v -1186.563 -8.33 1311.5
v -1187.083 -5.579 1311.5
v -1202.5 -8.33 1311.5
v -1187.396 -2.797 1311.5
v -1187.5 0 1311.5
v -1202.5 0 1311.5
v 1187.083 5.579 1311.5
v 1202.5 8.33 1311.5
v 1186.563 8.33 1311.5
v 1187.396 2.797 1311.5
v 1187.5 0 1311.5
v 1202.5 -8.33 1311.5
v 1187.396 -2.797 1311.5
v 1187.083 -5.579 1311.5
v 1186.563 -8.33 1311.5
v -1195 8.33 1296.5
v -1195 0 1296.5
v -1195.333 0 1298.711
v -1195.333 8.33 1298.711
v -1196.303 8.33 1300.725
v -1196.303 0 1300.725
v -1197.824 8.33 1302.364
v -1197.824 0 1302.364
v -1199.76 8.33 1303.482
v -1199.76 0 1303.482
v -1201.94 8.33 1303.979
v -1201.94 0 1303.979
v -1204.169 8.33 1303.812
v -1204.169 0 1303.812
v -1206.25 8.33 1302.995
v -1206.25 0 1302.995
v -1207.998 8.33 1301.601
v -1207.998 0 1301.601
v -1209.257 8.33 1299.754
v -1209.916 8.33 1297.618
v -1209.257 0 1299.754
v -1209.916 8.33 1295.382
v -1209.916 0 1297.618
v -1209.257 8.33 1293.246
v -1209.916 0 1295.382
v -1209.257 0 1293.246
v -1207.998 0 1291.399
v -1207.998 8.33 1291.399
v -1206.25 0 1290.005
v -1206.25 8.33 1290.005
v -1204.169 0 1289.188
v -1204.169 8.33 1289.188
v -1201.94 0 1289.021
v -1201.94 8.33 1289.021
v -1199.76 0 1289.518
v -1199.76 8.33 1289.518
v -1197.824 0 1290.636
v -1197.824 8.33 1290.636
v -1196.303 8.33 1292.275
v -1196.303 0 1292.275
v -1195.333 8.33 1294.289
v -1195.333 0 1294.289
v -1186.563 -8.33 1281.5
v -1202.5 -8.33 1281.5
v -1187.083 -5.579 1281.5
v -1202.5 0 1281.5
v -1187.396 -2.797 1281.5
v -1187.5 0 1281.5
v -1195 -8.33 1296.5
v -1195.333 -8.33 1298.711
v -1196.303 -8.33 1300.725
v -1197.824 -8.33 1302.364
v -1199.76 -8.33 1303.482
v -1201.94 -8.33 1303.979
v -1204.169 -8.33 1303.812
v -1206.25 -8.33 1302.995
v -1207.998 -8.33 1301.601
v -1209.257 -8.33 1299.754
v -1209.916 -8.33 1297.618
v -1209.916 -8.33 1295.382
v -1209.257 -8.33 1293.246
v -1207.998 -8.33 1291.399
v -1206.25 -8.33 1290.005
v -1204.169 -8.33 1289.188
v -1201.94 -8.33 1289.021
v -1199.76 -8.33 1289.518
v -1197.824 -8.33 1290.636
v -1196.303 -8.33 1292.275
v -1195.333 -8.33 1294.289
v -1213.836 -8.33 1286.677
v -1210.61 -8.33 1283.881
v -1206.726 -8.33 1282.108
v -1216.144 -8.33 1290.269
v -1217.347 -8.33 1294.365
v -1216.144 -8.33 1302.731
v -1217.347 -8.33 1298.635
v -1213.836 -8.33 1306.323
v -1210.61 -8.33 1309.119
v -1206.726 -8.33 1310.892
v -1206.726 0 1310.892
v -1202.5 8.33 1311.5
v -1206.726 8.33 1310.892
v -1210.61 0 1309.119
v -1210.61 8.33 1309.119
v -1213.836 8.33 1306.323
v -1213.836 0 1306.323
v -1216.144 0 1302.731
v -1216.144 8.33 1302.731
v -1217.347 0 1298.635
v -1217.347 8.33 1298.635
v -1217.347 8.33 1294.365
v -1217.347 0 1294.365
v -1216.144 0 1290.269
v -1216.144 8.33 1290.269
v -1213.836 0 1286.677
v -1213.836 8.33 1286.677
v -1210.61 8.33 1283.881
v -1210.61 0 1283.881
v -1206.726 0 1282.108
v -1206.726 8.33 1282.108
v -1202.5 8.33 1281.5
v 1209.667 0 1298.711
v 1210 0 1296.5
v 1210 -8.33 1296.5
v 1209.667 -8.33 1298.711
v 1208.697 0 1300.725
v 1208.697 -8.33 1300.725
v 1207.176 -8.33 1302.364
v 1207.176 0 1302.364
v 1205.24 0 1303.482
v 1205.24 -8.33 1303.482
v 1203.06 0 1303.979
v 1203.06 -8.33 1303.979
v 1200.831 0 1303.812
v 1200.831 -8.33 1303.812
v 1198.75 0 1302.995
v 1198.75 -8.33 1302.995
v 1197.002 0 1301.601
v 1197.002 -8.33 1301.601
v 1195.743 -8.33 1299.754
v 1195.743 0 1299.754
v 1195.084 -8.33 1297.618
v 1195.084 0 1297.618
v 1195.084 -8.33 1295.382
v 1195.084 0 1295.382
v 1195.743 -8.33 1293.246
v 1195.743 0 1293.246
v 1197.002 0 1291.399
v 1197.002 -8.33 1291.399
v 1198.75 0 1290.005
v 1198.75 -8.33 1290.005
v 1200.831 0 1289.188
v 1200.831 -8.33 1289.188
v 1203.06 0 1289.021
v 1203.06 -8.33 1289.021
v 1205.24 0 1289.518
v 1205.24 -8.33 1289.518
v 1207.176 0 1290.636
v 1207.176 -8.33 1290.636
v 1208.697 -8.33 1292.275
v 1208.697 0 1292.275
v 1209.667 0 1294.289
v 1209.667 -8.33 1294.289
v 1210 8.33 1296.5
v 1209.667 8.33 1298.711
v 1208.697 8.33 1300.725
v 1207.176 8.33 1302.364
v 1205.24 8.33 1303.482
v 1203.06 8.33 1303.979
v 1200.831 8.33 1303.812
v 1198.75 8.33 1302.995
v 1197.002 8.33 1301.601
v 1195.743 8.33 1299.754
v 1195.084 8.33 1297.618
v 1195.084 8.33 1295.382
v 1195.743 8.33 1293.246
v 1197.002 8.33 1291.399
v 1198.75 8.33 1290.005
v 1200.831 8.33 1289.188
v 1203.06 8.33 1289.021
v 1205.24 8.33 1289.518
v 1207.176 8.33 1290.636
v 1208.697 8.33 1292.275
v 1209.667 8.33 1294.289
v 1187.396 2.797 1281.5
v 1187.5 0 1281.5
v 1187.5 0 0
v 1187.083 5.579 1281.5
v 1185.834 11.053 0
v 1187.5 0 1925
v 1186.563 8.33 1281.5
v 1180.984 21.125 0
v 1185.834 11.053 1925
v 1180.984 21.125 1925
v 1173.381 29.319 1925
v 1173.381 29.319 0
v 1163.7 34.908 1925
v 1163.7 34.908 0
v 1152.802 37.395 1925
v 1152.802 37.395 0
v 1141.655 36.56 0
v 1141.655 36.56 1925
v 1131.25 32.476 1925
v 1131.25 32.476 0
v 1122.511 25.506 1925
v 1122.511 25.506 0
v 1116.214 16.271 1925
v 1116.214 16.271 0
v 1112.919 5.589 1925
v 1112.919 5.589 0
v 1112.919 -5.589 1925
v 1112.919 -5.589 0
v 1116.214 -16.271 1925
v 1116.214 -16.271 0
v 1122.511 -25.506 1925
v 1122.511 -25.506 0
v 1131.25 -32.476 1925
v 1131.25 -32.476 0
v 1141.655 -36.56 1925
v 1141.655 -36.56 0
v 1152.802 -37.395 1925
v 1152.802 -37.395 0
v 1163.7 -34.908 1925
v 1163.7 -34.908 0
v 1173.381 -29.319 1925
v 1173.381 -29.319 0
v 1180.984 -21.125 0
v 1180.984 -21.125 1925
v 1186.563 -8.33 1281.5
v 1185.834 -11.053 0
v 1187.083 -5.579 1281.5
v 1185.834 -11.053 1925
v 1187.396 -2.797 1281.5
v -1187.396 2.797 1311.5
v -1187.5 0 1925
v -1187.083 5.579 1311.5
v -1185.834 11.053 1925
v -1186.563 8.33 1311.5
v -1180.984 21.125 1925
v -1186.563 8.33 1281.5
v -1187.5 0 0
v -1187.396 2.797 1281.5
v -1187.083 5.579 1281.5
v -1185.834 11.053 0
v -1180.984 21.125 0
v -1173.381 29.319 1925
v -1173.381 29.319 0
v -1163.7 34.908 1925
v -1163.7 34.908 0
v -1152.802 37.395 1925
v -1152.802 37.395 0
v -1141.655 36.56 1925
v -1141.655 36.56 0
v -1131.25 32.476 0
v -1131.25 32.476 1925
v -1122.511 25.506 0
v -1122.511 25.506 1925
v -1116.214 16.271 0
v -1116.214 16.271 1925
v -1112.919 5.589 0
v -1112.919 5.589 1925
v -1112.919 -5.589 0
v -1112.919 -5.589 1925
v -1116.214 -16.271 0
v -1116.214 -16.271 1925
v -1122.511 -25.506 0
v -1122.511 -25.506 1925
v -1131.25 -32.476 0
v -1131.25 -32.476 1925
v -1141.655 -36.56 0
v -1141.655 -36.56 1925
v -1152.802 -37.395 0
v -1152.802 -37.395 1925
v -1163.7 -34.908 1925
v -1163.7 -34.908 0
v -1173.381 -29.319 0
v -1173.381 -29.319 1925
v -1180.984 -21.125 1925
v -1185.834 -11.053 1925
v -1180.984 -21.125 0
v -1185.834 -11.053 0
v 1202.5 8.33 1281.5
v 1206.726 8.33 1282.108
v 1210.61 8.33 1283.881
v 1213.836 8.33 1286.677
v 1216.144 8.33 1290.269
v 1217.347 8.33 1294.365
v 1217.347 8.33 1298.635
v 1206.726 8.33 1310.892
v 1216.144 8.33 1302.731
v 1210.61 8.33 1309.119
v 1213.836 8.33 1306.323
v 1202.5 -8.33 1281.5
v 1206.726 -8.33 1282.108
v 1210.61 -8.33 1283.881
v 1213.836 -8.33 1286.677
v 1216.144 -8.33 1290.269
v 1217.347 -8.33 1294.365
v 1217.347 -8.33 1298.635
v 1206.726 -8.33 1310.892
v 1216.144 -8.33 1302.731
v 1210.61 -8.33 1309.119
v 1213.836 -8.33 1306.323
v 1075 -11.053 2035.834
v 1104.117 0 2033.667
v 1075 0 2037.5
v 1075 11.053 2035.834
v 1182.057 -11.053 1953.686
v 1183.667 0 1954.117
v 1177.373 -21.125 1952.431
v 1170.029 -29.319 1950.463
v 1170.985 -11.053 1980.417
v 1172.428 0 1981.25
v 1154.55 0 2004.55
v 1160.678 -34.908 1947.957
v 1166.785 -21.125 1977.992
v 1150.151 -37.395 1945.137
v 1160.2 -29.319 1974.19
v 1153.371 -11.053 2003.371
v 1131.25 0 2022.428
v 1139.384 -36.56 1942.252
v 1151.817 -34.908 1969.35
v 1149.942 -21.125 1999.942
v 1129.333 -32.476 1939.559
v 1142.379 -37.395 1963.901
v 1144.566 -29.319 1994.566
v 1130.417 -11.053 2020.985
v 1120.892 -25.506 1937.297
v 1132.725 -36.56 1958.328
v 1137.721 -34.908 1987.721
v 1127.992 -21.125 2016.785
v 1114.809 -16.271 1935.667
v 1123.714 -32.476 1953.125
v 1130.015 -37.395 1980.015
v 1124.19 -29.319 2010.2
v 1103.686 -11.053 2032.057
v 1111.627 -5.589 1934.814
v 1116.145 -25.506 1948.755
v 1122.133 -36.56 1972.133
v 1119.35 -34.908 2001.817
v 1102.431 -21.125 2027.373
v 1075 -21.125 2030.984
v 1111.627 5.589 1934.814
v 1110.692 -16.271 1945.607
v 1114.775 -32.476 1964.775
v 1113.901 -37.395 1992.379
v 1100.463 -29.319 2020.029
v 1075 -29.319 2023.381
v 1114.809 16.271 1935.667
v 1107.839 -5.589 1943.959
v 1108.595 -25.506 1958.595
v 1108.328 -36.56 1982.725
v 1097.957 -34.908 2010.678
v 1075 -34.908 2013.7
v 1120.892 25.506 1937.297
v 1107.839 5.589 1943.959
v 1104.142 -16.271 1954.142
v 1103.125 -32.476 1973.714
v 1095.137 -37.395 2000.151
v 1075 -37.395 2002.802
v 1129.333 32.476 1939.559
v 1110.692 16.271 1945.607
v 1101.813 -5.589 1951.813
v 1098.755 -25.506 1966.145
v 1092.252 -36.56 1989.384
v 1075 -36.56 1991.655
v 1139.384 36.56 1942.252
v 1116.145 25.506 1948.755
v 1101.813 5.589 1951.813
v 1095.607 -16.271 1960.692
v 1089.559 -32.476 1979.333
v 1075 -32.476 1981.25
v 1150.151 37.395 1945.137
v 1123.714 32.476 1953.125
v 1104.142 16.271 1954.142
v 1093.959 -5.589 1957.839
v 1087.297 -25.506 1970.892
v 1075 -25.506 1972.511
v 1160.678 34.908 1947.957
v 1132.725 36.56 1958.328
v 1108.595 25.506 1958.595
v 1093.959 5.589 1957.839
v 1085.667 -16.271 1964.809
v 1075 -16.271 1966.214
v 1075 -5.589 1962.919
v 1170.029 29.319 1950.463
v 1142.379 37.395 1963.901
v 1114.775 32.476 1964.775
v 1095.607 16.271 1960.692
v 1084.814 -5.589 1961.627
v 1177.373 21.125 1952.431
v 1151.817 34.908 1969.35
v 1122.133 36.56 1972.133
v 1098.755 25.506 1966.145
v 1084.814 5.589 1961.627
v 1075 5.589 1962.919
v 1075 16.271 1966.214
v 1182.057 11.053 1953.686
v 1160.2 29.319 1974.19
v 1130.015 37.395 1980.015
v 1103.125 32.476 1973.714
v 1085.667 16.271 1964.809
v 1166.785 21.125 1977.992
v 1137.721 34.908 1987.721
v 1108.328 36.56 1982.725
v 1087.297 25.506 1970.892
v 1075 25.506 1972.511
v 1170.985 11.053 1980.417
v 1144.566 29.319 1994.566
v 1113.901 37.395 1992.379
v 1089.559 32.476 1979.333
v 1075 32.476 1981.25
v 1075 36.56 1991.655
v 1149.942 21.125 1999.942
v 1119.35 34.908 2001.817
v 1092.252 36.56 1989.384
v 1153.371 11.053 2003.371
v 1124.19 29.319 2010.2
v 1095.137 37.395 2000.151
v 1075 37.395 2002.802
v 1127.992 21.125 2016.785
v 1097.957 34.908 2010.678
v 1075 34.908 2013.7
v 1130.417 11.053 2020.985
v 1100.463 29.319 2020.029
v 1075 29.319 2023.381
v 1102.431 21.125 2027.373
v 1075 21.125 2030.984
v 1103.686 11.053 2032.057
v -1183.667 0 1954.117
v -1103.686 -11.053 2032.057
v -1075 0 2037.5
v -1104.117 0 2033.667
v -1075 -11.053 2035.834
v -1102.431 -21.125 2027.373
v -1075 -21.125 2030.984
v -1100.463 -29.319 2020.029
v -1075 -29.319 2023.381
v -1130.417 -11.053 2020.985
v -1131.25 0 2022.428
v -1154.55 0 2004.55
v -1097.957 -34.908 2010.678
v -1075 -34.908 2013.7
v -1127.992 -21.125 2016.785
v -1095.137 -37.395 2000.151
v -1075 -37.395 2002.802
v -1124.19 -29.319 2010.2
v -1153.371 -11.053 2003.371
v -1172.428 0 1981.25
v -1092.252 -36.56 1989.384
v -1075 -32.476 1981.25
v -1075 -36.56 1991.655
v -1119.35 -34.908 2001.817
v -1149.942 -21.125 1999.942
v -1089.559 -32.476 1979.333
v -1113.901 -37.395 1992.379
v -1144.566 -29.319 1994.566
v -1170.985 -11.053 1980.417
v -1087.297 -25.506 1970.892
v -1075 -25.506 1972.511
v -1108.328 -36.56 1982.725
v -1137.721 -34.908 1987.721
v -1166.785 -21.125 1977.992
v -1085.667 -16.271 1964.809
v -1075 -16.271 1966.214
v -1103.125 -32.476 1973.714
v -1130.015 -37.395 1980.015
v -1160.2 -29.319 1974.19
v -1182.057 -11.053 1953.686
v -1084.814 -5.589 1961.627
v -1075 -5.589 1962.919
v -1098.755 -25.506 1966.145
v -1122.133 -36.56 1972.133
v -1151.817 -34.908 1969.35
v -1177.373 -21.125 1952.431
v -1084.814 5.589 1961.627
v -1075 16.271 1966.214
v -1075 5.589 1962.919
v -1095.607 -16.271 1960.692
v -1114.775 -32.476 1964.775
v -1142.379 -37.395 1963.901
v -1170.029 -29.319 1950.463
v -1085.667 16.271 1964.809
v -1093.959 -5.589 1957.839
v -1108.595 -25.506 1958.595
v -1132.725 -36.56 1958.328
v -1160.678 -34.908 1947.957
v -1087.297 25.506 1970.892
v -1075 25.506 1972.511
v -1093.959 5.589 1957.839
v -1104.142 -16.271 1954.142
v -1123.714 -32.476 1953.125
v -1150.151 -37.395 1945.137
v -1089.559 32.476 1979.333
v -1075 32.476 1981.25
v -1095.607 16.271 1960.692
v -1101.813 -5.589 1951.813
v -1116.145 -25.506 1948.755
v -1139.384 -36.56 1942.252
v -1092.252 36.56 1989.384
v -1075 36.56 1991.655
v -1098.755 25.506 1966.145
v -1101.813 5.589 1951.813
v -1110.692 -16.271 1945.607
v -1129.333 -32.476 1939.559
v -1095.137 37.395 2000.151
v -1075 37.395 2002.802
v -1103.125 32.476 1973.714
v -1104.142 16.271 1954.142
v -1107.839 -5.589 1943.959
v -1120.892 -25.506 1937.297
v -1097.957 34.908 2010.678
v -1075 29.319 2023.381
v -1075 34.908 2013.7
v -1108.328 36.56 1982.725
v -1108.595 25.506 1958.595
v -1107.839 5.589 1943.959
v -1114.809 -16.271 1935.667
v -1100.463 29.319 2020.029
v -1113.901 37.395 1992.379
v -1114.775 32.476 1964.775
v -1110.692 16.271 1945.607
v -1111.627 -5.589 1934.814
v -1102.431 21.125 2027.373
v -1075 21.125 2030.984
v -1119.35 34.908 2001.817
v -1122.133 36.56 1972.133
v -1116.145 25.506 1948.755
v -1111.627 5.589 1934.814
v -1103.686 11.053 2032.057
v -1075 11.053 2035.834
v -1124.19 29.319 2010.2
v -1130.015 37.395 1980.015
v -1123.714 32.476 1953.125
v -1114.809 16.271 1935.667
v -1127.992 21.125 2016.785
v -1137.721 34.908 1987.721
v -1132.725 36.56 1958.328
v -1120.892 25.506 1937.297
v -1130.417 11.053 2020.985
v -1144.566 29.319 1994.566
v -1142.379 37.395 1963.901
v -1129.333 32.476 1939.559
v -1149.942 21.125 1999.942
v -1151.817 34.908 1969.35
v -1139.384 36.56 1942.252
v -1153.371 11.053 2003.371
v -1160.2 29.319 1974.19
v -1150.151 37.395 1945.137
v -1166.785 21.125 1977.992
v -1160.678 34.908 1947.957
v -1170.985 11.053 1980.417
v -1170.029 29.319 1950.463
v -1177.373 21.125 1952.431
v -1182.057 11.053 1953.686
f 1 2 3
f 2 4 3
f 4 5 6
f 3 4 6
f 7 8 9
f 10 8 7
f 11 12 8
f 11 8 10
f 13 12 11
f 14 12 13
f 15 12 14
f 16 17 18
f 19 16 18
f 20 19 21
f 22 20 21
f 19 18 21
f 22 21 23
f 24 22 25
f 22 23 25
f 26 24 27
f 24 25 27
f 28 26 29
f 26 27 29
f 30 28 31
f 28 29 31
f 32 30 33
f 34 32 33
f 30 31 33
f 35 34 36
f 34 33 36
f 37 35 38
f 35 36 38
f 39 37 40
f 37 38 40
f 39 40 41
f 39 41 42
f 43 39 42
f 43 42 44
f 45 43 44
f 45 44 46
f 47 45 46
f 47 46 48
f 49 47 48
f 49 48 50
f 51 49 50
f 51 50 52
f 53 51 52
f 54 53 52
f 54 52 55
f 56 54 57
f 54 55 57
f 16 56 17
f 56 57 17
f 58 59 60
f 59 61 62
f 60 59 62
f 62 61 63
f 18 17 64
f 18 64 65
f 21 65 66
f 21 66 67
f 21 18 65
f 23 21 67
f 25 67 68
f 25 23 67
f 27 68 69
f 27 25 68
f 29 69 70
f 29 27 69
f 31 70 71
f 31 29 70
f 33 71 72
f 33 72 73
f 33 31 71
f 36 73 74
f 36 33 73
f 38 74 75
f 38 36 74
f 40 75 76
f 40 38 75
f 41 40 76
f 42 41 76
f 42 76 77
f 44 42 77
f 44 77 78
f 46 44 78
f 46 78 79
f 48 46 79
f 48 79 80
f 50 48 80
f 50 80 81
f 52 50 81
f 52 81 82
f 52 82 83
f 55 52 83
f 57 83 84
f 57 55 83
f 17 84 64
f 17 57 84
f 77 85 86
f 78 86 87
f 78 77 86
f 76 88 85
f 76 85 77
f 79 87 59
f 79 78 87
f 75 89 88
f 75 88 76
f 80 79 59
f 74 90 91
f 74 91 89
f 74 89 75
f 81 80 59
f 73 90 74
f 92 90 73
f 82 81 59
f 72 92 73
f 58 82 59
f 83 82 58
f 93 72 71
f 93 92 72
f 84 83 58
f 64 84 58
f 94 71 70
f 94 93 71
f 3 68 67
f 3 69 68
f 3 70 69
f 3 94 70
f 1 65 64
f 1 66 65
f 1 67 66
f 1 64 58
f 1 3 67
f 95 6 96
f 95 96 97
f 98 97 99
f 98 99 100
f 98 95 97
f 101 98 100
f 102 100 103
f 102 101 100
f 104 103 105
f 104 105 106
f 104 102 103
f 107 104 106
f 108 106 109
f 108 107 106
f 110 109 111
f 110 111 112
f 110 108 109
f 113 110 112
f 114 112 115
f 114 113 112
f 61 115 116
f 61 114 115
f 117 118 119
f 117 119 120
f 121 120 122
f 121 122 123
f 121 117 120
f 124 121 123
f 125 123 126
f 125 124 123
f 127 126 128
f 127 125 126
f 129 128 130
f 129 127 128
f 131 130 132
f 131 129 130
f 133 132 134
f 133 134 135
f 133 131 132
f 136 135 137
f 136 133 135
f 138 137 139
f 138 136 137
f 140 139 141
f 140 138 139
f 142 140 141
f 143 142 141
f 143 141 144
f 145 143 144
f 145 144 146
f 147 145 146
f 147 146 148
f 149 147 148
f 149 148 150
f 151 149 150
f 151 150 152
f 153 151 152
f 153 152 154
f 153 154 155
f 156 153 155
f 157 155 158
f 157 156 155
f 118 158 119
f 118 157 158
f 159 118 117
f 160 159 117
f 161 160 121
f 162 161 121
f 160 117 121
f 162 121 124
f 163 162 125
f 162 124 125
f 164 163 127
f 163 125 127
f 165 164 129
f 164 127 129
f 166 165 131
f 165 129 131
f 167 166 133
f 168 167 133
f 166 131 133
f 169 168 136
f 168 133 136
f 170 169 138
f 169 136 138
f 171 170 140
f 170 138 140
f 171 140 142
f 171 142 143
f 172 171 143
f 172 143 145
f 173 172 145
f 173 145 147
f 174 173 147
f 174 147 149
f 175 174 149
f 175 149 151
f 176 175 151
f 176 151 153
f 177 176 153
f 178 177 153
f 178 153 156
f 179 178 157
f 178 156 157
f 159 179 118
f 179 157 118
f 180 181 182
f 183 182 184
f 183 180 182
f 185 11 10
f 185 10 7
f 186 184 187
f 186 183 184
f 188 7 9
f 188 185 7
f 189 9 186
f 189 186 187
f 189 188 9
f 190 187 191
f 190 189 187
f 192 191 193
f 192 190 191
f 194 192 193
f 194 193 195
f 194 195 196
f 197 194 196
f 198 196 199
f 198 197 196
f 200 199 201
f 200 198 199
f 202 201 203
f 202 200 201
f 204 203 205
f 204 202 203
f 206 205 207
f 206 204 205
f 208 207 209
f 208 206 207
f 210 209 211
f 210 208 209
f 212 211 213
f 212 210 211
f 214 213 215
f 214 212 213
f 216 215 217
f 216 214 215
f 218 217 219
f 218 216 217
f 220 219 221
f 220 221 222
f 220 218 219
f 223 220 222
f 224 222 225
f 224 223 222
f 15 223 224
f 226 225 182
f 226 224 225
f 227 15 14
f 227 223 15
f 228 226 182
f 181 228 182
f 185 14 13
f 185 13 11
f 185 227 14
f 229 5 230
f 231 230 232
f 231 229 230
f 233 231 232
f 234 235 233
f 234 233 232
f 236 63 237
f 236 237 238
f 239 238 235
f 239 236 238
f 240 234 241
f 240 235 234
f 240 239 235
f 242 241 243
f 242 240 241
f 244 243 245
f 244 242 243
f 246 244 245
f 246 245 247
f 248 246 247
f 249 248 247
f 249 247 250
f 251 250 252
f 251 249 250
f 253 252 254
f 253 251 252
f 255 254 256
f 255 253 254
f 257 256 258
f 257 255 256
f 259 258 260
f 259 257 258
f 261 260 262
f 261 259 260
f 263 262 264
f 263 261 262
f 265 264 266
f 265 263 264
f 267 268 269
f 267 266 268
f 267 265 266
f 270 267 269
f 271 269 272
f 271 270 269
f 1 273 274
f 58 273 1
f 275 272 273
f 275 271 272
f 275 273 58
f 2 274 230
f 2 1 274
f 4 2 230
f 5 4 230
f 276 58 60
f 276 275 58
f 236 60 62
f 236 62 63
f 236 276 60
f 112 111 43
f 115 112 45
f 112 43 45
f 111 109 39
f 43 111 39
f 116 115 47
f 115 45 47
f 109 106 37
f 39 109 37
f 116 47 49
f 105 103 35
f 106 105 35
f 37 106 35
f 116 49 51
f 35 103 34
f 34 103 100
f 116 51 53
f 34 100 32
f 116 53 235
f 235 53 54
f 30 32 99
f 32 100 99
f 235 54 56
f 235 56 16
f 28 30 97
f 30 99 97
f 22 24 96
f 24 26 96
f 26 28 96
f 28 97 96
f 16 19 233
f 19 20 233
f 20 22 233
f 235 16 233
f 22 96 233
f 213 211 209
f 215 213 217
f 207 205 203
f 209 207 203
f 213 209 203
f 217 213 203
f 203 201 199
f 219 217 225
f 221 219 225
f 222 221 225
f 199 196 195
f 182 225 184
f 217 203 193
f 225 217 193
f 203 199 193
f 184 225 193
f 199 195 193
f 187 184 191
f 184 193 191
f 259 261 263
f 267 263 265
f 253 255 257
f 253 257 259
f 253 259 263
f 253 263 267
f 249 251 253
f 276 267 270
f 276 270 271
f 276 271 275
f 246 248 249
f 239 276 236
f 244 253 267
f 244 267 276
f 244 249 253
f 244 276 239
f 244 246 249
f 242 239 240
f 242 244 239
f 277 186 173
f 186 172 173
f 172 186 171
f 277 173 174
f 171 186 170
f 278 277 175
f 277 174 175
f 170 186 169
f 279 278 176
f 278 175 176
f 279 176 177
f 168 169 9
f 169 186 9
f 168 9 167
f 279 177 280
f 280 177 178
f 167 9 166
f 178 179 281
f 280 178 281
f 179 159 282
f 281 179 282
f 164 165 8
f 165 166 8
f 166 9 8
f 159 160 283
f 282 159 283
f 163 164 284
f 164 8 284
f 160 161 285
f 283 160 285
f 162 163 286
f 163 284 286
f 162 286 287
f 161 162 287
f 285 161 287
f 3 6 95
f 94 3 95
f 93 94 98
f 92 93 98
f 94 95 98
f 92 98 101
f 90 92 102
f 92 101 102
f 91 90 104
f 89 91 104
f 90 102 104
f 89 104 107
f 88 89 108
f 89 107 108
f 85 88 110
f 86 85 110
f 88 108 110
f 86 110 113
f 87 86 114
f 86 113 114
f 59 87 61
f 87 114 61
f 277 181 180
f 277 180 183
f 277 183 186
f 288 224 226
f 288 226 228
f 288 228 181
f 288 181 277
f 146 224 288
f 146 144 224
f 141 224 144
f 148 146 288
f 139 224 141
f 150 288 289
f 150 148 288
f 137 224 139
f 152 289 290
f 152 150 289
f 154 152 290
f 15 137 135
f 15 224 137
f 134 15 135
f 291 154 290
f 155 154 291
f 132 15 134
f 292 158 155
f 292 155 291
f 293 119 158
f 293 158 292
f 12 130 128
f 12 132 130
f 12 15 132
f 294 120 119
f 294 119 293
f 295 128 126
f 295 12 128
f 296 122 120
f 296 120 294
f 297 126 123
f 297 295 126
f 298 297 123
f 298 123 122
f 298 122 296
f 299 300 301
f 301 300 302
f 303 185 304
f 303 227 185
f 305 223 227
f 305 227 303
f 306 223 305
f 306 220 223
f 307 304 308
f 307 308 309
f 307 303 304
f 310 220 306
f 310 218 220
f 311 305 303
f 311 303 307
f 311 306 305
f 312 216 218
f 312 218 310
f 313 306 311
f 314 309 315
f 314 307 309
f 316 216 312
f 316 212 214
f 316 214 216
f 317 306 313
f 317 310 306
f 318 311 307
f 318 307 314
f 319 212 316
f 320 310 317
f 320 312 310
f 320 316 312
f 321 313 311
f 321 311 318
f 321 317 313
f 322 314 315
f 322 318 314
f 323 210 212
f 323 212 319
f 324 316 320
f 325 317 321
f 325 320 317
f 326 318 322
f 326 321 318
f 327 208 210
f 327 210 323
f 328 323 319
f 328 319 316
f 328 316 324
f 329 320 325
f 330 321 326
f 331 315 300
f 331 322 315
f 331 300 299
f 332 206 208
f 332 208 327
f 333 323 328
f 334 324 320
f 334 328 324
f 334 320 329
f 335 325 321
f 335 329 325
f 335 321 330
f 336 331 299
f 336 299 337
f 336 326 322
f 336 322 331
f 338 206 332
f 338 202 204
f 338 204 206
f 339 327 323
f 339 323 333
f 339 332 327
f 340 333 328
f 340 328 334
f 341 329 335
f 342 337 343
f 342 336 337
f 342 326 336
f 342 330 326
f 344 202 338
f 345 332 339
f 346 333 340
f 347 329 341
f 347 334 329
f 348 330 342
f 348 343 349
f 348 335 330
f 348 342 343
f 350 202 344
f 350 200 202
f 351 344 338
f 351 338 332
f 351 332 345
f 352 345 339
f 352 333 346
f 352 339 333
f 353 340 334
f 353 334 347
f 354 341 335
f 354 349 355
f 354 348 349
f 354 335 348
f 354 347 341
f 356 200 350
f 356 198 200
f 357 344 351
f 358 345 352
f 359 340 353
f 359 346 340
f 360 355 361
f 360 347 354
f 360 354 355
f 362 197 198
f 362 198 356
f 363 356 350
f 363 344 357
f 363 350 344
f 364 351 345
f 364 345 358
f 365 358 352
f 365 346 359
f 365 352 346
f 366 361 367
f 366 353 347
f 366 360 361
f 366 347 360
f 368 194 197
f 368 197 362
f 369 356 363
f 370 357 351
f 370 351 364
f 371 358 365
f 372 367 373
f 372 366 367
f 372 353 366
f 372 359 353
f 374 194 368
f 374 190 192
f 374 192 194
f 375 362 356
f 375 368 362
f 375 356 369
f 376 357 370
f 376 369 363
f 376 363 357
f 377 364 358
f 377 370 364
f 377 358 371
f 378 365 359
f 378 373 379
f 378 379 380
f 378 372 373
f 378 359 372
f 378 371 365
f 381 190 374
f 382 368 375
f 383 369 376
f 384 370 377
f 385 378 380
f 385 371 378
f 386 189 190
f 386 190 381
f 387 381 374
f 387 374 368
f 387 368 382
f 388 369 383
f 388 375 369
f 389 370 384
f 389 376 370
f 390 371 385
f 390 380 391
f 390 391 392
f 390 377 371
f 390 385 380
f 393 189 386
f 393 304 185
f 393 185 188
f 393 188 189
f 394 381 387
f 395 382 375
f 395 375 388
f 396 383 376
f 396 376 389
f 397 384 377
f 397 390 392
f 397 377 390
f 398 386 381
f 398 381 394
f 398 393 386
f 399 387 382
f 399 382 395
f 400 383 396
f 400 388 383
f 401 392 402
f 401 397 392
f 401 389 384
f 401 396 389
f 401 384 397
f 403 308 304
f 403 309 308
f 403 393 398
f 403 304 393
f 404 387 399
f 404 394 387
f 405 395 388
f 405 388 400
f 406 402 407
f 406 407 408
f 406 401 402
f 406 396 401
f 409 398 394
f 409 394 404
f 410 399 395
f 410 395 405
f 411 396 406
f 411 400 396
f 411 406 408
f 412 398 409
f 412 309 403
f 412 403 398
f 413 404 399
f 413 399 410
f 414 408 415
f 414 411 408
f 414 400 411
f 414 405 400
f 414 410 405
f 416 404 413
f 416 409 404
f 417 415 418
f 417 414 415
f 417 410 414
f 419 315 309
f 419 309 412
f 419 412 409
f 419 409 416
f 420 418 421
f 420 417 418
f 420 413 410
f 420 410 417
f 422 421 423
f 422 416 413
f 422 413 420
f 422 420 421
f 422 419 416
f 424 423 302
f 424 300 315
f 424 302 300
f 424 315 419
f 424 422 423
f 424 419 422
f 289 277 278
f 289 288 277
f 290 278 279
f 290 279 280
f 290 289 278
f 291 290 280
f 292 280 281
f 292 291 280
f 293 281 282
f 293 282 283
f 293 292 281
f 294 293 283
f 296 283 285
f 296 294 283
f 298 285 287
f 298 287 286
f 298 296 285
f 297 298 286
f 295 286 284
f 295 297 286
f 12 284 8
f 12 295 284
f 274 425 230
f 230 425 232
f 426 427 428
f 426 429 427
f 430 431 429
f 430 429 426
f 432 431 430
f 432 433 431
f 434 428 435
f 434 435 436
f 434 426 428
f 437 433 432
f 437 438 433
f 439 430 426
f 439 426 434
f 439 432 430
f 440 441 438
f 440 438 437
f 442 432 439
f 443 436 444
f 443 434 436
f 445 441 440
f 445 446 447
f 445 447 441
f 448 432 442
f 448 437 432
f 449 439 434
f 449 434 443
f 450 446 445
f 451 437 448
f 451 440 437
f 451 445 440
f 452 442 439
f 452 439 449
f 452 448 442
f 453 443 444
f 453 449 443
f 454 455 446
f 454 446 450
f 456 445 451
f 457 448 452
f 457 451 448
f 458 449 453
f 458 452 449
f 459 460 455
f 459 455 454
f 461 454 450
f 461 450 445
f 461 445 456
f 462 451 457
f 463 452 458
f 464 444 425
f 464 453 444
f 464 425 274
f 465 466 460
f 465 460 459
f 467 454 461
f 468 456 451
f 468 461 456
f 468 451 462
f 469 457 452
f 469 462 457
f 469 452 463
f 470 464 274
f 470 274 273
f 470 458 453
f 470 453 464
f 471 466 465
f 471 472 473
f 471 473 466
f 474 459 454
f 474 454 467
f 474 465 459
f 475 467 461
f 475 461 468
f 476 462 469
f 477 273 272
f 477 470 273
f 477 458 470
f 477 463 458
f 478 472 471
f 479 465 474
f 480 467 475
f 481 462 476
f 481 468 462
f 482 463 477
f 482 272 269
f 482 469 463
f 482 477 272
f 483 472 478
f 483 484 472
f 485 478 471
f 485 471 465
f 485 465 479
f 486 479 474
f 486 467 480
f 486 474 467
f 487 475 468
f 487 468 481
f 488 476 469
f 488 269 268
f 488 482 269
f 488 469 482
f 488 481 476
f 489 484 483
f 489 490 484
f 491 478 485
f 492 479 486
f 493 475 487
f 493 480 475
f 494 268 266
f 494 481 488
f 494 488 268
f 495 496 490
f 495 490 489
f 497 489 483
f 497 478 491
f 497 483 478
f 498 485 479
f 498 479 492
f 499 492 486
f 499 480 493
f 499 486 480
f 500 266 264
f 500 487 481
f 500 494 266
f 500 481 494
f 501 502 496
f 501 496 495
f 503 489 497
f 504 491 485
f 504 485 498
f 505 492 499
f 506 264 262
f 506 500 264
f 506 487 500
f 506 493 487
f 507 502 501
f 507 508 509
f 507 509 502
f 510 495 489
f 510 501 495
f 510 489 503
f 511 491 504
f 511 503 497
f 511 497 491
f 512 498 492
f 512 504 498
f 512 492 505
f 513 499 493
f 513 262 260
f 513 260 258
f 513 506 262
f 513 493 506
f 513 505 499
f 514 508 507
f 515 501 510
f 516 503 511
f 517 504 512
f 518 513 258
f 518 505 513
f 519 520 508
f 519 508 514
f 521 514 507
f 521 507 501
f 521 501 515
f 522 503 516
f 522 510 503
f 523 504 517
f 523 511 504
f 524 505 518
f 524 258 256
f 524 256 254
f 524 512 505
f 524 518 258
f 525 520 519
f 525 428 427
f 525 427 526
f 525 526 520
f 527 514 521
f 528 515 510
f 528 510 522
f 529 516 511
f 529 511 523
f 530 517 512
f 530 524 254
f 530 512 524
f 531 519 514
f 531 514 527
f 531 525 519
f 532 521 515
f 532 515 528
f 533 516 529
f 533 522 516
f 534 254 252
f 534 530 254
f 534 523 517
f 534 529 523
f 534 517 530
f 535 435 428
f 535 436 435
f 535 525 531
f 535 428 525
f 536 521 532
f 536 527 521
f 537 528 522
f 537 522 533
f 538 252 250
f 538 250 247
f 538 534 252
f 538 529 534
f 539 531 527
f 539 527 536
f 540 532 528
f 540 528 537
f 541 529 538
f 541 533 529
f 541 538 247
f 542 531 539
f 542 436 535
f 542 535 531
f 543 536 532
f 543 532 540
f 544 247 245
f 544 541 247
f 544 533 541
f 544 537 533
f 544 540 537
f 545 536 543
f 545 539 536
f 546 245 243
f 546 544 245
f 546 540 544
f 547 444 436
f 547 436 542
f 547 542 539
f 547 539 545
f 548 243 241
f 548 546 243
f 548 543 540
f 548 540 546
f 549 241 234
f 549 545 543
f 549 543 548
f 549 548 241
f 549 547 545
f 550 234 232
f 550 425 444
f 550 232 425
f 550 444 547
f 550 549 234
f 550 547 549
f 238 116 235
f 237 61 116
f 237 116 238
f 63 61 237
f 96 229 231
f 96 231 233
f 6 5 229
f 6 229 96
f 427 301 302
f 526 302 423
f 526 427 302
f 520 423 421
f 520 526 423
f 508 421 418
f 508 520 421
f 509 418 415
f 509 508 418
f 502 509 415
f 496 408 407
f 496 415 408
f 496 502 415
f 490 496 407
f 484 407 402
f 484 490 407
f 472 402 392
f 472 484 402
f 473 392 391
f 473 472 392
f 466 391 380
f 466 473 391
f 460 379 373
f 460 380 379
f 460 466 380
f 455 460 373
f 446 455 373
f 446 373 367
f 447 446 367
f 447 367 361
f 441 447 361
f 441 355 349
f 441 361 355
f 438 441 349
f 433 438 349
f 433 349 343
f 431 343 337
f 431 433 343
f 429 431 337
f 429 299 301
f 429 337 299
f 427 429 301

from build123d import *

# Parameters (mm, degrees)
F0_R          = 37.5
F3_R          = 7.5
F4_DEPTH      = 8.33
F4_DEPTH_BACK = 8.33


with BuildPart() as f2:
    # F2: sweep along a path in F1
    with BuildLine(Plane.XZ) as f2_path:
        Line((1150, 0), (1150, 1925))
        ThreePointArc((1150, 1925), (1128.033008589, 1978.033008589), (1075, 2000))
        Line((1075, 2000), (-1075, 2000))
        ThreePointArc((-1075, 2000), (-1128.033008589, 1978.033008589), (-1150, 1925))
        Line((-1150, 1925), (-1150, 0))
    # F0 (on Top) → F2 (sweep)
    with BuildSketch(Plane.XY):
        with Locations((1150, 0)):
            Circle(F0_R)
    sweep(path=f2_path.line)

    # F3 (on Front) → F4 (join, two sides)
    with BuildSketch(Plane.XZ) as f4_sk:
        with BuildLine():
            Line((1202.5, 1311.5), (1150, 1311.5))
            Line((1150, 1311.5), (1150, 1281.5))
            Line((1150, 1281.5), (1202.5, 1281.5))
            ThreePointArc((1202.5, 1281.5), (1213.1066017178, 1285.8933982822), (1217.5, 1296.5))
            ThreePointArc((1217.5, 1296.5), (1213.1066017178, 1307.1066017178), (1202.5, 1311.5))
        make_face()
        with Locations((1202.5, 1296.5)):
            Circle(F3_R, mode=Mode.SUBTRACT)
        with BuildLine():
            Line((-1150, 1281.5), (-1150, 1311.5))
            Line((-1150, 1311.5), (-1202.5, 1311.5))
            ThreePointArc((-1202.5, 1311.5), (-1213.1066017178, 1307.1066017178), (-1217.5, 1296.5))
            ThreePointArc((-1217.5, 1296.5), (-1213.1066017178, 1285.8933982822), (-1202.5, 1281.5))
            Line((-1202.5, 1281.5), (-1150, 1281.5))
        make_face()
        with Locations((-1202.5, 1296.5)):
            Circle(F3_R, mode=Mode.SUBTRACT)
    extrude(amount=F4_DEPTH)
    extrude(f4_sk.sketch, amount=-F4_DEPTH_BACK)


solid = f2.part
